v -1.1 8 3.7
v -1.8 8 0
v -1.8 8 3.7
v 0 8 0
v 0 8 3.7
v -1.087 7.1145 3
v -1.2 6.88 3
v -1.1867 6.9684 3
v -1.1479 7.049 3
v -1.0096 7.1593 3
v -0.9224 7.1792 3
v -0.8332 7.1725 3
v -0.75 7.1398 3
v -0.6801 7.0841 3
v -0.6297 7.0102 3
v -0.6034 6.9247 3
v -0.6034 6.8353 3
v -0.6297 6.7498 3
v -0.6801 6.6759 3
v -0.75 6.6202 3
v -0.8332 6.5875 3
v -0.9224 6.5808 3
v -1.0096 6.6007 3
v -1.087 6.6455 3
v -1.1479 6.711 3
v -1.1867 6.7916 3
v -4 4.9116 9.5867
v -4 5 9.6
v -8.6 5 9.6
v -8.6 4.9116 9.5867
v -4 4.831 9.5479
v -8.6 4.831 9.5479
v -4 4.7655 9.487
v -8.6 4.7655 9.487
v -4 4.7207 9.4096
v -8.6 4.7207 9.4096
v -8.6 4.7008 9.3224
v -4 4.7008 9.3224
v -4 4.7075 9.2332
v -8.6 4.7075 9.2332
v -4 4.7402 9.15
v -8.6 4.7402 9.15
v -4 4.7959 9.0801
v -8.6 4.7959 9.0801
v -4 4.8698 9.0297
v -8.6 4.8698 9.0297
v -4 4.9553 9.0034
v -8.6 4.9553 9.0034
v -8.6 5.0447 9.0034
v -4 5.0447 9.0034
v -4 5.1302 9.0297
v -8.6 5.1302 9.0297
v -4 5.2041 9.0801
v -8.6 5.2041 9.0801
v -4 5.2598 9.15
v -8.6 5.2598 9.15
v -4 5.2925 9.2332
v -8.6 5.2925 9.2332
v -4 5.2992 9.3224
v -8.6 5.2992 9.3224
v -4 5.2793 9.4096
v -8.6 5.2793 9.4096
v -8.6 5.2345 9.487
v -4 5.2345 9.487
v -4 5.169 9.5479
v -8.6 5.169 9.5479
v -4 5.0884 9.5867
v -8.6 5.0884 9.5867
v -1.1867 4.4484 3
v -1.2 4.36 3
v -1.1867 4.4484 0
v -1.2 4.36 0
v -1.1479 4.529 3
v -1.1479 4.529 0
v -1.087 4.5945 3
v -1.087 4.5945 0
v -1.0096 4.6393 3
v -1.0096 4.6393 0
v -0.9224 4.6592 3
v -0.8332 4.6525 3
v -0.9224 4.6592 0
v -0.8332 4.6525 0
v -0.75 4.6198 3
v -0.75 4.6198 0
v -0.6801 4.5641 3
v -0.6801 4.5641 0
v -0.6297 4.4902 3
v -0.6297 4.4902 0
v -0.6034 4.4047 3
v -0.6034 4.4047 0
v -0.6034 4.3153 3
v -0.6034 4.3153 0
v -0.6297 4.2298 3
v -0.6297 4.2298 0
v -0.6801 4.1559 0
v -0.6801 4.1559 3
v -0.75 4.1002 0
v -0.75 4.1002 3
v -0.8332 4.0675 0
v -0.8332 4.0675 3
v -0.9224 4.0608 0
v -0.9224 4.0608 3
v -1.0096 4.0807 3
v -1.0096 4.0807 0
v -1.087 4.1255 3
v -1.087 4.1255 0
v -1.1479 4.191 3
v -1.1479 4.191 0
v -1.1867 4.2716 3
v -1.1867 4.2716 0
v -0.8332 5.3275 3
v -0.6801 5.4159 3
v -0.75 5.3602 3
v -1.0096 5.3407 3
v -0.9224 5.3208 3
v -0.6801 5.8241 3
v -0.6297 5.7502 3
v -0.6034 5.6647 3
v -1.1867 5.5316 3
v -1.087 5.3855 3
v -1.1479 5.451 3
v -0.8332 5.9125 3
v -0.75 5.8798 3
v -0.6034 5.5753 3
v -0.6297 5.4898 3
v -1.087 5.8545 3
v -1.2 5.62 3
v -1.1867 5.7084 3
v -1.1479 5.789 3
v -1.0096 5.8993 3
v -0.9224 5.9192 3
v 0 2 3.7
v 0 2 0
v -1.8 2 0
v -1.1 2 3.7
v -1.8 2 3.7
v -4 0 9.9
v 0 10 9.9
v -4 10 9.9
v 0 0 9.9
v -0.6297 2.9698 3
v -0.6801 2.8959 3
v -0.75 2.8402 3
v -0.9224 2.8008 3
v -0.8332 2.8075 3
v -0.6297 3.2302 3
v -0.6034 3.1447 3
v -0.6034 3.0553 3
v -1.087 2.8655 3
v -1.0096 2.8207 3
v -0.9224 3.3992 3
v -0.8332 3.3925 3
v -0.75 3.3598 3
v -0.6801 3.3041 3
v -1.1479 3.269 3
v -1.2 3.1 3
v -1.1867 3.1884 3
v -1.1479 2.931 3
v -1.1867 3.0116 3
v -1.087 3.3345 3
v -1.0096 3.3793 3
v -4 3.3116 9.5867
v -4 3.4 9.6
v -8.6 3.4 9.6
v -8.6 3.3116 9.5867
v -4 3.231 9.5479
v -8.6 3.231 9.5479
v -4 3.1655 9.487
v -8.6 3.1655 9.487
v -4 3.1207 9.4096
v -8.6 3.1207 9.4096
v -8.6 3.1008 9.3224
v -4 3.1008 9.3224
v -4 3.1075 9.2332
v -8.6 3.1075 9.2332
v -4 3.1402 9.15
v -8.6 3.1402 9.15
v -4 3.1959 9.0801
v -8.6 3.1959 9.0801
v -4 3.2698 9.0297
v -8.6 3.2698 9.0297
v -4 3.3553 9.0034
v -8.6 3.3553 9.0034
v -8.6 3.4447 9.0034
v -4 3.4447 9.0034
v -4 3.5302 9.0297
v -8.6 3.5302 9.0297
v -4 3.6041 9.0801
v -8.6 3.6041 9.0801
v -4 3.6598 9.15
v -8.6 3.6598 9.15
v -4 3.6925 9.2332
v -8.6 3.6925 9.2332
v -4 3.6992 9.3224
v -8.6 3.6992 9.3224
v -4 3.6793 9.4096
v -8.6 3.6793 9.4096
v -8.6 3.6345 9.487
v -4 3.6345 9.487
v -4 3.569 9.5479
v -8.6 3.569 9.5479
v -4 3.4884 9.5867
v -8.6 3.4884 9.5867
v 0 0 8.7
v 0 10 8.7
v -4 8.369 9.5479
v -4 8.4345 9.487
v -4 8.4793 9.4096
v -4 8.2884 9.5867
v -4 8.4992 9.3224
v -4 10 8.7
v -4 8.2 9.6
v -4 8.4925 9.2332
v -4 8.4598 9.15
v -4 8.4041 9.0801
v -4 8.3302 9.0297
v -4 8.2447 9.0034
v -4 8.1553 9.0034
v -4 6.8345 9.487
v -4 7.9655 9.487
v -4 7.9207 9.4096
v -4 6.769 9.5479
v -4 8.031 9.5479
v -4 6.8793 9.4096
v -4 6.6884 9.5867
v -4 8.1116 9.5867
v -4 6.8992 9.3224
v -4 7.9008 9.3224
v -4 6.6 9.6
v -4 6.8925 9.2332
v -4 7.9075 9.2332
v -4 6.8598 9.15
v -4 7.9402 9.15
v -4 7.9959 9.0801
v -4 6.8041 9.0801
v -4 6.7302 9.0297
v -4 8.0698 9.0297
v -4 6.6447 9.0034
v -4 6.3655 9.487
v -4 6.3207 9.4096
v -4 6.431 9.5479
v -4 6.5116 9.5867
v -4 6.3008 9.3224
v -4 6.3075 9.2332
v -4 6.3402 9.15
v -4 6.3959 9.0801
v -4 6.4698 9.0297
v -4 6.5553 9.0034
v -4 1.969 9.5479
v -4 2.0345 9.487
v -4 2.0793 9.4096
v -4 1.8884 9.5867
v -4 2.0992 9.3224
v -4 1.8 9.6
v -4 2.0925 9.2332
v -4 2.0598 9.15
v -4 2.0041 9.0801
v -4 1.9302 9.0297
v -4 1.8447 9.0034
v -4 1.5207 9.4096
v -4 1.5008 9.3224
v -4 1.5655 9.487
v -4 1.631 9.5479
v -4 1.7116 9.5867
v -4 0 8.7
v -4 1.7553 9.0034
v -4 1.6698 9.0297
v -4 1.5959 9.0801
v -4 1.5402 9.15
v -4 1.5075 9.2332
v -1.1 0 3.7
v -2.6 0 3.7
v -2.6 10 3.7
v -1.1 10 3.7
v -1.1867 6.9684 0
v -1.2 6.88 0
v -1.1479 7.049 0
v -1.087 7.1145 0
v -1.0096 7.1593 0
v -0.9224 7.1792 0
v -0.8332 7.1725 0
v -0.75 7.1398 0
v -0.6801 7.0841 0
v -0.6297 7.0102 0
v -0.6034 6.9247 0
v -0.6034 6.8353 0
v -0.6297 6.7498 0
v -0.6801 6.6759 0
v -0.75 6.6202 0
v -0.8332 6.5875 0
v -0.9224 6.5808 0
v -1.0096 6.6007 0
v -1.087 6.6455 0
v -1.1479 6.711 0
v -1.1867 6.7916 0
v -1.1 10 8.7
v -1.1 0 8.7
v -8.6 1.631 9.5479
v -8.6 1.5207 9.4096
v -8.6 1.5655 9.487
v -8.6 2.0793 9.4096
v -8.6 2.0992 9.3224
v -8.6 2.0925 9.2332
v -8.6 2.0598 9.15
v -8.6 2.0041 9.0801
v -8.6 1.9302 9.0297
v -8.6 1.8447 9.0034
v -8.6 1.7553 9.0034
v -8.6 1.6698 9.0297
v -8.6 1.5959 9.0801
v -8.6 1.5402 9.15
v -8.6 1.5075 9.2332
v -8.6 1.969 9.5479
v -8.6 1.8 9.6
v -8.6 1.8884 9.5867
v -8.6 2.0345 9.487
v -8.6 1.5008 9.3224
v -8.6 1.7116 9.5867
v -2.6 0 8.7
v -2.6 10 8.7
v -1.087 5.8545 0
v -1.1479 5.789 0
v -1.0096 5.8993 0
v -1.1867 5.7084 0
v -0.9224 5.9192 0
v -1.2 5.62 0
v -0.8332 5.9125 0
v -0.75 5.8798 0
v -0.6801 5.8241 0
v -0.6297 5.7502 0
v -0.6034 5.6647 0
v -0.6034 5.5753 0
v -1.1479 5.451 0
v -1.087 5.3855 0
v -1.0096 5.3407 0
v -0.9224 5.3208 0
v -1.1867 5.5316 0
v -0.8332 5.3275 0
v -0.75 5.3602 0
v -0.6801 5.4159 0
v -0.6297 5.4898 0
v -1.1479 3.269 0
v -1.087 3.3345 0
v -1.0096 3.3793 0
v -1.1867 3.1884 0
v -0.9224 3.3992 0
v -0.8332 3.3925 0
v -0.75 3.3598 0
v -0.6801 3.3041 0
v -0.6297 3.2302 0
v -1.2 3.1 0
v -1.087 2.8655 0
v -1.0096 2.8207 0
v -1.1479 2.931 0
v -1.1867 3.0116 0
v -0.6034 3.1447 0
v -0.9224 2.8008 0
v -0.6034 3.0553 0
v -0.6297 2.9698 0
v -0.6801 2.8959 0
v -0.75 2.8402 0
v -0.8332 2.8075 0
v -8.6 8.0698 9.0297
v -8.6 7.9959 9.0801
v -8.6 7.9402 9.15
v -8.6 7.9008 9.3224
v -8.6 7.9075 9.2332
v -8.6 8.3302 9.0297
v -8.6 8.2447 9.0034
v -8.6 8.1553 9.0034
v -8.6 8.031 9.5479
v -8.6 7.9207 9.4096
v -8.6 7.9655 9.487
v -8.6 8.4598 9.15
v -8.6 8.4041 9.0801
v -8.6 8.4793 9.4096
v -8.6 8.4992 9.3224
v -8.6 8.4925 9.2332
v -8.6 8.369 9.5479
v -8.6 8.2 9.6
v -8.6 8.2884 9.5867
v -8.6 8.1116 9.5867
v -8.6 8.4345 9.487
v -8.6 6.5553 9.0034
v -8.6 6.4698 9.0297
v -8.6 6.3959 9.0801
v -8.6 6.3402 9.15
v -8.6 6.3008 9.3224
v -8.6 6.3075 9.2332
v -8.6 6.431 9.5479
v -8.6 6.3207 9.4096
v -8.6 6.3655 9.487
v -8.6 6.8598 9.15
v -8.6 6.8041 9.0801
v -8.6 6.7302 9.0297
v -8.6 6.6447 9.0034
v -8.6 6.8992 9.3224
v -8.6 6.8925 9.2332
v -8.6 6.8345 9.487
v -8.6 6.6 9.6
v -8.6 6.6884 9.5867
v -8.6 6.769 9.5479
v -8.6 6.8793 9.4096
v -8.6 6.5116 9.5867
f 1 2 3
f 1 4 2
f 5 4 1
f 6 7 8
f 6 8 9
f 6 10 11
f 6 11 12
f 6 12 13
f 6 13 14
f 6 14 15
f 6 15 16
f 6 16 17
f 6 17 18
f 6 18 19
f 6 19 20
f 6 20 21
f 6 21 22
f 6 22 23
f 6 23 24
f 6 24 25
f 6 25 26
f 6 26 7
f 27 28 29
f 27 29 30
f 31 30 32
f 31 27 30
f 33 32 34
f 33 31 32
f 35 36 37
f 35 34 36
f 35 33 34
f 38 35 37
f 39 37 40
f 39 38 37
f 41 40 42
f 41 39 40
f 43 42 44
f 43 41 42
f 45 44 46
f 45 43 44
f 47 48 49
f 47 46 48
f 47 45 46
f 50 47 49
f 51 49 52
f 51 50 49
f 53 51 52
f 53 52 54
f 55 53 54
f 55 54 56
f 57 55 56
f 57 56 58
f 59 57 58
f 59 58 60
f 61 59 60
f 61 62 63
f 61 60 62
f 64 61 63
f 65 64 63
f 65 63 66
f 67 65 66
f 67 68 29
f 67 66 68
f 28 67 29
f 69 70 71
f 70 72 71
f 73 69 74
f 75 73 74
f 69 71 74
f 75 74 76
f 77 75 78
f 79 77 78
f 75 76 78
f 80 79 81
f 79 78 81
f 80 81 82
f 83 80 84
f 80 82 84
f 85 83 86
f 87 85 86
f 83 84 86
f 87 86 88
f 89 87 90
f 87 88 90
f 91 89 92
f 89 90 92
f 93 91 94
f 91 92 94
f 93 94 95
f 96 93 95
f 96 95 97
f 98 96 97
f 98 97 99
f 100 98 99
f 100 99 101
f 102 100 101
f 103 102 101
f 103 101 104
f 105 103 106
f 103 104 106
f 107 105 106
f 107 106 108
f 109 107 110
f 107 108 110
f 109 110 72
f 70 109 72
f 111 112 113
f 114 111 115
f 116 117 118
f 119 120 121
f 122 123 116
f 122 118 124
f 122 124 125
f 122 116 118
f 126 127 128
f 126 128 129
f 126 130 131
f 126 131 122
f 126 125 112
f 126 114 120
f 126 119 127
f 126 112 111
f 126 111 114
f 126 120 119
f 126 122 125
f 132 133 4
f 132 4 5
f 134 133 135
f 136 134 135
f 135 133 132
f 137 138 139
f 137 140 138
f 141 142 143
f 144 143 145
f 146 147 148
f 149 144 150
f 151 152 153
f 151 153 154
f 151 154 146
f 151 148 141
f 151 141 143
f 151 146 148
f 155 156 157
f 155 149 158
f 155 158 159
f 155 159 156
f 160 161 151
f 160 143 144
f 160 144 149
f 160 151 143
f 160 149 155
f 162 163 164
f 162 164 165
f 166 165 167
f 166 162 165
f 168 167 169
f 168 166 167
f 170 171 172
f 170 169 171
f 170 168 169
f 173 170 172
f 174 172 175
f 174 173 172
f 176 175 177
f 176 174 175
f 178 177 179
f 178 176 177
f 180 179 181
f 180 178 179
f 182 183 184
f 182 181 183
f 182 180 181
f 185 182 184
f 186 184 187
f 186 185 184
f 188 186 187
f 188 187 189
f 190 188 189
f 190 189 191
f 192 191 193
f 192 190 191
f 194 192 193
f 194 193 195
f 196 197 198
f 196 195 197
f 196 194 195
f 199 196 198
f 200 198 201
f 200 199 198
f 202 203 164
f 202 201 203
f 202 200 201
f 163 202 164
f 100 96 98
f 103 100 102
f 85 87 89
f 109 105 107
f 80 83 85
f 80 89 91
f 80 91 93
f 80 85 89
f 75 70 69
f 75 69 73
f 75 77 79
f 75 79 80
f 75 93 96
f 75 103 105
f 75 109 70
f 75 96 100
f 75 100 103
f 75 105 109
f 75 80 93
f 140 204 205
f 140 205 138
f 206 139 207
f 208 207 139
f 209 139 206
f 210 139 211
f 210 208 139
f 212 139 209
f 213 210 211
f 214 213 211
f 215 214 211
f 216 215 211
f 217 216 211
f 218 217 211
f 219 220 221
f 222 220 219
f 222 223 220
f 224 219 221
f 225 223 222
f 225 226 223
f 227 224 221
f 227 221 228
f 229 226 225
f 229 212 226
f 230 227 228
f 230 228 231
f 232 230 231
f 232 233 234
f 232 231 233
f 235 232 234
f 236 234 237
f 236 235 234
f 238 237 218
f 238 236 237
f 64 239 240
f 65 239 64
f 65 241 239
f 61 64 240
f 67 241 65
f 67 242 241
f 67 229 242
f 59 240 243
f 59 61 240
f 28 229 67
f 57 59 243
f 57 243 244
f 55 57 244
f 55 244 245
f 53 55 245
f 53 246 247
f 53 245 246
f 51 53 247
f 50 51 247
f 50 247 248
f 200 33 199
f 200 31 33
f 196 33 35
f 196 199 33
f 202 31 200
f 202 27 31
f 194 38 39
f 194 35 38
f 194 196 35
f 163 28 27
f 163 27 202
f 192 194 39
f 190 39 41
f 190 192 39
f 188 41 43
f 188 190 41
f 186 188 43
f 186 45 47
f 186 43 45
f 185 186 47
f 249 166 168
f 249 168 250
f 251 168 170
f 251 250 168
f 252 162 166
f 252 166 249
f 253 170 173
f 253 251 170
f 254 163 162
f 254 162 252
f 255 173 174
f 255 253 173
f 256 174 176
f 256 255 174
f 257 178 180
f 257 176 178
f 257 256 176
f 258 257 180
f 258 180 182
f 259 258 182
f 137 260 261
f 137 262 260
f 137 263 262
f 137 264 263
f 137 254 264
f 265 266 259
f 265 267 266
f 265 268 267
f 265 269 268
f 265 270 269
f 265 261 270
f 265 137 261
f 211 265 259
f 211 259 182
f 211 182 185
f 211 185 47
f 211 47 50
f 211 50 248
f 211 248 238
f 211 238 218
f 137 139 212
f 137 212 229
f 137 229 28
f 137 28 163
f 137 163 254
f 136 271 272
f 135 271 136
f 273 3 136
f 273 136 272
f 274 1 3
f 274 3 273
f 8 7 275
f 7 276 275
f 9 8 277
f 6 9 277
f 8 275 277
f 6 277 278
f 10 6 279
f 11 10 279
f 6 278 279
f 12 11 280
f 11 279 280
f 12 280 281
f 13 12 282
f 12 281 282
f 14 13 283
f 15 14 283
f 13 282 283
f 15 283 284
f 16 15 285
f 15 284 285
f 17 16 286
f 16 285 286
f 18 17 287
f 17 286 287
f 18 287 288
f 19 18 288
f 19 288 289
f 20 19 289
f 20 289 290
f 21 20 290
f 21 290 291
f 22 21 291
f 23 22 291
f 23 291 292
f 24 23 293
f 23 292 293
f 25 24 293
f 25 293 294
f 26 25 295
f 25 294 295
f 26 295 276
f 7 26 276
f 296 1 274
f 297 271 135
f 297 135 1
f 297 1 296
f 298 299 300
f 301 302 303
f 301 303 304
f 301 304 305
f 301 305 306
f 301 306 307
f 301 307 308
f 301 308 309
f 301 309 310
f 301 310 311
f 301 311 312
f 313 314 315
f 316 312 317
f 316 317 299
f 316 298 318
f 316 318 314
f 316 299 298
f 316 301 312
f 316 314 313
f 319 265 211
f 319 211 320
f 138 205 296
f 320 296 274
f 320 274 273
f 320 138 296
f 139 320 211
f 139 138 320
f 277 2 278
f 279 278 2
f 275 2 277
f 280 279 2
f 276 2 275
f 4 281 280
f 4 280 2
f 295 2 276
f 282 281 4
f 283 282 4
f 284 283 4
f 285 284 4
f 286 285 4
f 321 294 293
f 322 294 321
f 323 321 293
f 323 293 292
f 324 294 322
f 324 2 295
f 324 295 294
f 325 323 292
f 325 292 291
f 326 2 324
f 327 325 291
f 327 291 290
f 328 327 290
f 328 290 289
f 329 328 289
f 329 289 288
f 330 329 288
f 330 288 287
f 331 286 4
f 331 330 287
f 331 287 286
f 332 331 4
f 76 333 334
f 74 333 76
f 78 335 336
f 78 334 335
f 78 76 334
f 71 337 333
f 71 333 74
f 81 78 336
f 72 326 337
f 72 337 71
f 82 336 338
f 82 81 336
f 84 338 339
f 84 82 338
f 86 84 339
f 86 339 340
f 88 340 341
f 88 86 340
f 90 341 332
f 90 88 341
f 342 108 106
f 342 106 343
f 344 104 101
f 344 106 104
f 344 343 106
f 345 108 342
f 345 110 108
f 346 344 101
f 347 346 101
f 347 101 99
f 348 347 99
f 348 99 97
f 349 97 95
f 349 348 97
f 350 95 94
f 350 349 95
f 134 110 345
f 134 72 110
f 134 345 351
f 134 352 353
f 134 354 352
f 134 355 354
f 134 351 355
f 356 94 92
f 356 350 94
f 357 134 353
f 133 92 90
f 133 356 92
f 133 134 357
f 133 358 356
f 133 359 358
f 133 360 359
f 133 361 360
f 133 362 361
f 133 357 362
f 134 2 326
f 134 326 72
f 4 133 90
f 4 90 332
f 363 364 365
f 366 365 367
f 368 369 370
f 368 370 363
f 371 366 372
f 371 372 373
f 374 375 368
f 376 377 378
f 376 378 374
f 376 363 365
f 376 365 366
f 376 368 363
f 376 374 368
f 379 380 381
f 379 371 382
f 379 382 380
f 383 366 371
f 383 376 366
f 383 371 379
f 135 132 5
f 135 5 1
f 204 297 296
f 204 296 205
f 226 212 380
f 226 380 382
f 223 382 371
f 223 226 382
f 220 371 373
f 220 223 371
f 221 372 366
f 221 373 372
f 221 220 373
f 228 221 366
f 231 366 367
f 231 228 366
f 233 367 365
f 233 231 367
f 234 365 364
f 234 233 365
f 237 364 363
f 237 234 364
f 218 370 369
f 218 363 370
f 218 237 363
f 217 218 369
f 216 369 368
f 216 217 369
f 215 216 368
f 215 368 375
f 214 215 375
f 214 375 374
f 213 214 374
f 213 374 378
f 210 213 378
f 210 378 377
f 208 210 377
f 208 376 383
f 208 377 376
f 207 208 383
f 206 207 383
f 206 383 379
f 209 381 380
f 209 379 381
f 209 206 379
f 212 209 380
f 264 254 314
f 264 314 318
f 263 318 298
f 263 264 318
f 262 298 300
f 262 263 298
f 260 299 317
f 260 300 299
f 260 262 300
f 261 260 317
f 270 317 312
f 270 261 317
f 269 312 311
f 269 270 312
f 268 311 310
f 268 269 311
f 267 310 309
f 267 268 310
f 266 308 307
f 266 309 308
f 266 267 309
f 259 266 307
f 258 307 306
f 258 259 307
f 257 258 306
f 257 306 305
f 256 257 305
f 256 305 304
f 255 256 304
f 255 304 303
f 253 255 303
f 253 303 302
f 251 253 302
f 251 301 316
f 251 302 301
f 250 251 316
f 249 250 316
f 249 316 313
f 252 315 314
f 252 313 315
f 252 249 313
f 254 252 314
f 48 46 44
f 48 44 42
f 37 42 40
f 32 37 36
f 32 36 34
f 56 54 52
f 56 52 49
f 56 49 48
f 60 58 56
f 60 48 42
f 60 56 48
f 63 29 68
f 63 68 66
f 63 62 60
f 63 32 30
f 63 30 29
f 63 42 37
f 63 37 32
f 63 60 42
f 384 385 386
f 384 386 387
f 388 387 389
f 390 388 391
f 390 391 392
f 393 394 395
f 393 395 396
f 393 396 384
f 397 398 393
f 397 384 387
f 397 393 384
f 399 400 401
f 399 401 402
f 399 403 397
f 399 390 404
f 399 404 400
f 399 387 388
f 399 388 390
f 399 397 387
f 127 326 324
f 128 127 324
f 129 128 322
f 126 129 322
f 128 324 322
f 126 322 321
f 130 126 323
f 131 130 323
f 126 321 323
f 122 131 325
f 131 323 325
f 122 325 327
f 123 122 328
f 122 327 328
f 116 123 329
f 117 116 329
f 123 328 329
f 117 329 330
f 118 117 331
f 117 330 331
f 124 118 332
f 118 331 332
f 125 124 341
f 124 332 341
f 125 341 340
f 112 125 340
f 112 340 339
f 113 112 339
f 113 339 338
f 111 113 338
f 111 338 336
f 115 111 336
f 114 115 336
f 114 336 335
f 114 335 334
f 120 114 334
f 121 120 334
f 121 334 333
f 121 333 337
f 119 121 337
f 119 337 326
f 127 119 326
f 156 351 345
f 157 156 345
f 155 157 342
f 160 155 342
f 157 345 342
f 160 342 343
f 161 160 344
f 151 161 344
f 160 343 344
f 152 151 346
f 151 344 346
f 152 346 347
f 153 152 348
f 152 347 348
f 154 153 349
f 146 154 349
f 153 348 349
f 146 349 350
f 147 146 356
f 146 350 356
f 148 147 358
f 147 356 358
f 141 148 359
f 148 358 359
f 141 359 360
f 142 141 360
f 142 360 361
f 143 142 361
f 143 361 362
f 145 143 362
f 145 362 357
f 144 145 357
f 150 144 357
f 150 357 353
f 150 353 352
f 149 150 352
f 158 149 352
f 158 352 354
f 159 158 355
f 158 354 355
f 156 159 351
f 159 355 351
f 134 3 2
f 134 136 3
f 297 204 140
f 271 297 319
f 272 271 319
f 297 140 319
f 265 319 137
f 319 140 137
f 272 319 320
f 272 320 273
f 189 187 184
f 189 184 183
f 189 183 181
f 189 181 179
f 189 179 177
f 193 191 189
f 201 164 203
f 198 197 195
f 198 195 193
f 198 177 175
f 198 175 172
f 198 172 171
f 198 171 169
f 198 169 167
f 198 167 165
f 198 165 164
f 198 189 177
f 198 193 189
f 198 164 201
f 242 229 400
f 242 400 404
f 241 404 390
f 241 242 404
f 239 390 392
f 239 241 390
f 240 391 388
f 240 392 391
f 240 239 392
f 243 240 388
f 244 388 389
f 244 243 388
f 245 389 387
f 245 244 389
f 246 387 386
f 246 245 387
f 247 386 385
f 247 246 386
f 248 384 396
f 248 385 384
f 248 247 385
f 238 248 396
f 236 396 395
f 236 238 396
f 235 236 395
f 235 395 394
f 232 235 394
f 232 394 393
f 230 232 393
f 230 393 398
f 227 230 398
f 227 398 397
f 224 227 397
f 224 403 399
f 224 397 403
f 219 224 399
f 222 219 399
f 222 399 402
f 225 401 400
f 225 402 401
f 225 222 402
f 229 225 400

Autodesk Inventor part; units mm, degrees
ref_plane "YZ Plane" through (0, 0, 0) normal (1, 0, 0) x (0, 1, 0)
ref_plane "XZ Plane" through (0, 0, 0) normal (0, 1, 0) x (-1, 0, 0)
ref_plane "XY Plane" through (0, 0, 0) normal (0, 0, 1) x (1, 0, 0)
sketch "Sketch1" plane through (0, 0, 0) normal (0, 1, 0) x (-1, 0, 0)
  line L0 (0, 0) -> (0, 3.7)
  line L1 (0, 3.7) -> (1.1, 3.7)
  line L2 (1.1, 8.7) -> (0, 8.7)
  line L3 (0, 8.7) -> (0, 9.9)
  line L4 (0, 9.9) -> (4, 9.9)
  line L5 (4, 9.9) -> (4, 8.7)
  line L6 (4, 8.7) -> (2.6, 8.7)
  line L7 (2.6, 8.7) -> (2.6, 3.7)
  line L8 (2.6, 3.7) -> (1.8, 3.7)
  line L9 (1.8, 3.7) -> (1.8, 0)
  line L10 (1.8, 0) -> (0, 0)
  line L11 (1.1, 3.7) -> (1.1, 8.7)
  dimension "d0" = 3.7
  dimension "d1" = 1.8
  dimension "d2" = 1.1
  dimension "d3" = 1.2
  dimension "d4" = 1.5
  dimension "d5" = 5
  dimension "d6" = 4
extrude "Extrusion1" add sketch "Sketch1" along normal blind 10
sketch "Sketch2" plane through (0, 0, 3.7) normal (1, 0, 0) x (0, 0, -1)
  line L0 (0, 0) -> (0, 10) projected
  line L1 (0, 0) -> (4, 0)
  line L2 (4, 0) -> (4, 2)
  line L3 (4, 2) -> (0, 2)
  line L4 (0, 2) -> (0, 0)
  line L5 (0, 5) -> (3.7, 5) construction
  line L6 (0, 10) -> (4, 10)
  line L7 (4, 10) -> (4, 8)
  line L8 (4, 8) -> (0, 8)
  line L9 (0, 8) -> (0, 10)
  point P0 (3.7, 0)
  dimension "d9" = 6
  dimension "d10" = 4
extrude "Extrusion2" cut sketch "Sketch2" against normal up to next
sketch "Sketch3" plane through (0, 8, 0) normal (0, 0, -1) x (-1, 0, 0)
  circle A0 centre (0.9, -1.12) radius 0.3
  circle A1 centre (0.9, -2.38) radius 0.3
  circle A2 centre (0.9, -3.64) radius 0.3
  circle A3 centre (0.9, -4.9) radius 0.3
  line L0 (0, -6) -> (1.8, -6) projected
  line L1 (0, -6) -> (0, 0) projected
  line L2 (0.9, -4.9) -> (0.9, -1.12) construction
  point P0 (0, -8)
  dimension "d13" = 0.6
  dimension "d14" = 1.26
  dimension "d15" = 1.26
  dimension "d16" = 1.26
  dimension "d17" = 1.1
  dimension "d18" = 0.9
extrude "Extrusion3" cut sketch "Sketch3" against normal blind 3
sketch "Sketch4" plane through (-4, 0, 8.7) normal (-1, 0, 0) x (0, 0, 1)
  circle A0 centre (0.6, 8.2) radius 0.3
  circle A1 centre (0.6, 6.6) radius 0.3
  circle A2 centre (0.6, 5) radius 0.3
  circle A3 centre (0.6, 3.4) radius 0.3
  circle A4 centre (0.6, 1.8) radius 0.3
  line L0 (1.2, 0) -> (0, 0) projected
  line L1 (0.6, 0) -> (0.6, 9.9899) construction
  point P0 (-8.7, 0)
  dimension "d21" = 0.6
  dimension "d22" = 1.6
  dimension "d23" = 1.6
  dimension "d24" = 1.6
  dimension "d25" = 1.6
  dimension "d26" = 1.8
extrude "Extrusion4" add sketch "Sketch4" along normal blind 4.6
properties part number "humidity_sensor_mount"
